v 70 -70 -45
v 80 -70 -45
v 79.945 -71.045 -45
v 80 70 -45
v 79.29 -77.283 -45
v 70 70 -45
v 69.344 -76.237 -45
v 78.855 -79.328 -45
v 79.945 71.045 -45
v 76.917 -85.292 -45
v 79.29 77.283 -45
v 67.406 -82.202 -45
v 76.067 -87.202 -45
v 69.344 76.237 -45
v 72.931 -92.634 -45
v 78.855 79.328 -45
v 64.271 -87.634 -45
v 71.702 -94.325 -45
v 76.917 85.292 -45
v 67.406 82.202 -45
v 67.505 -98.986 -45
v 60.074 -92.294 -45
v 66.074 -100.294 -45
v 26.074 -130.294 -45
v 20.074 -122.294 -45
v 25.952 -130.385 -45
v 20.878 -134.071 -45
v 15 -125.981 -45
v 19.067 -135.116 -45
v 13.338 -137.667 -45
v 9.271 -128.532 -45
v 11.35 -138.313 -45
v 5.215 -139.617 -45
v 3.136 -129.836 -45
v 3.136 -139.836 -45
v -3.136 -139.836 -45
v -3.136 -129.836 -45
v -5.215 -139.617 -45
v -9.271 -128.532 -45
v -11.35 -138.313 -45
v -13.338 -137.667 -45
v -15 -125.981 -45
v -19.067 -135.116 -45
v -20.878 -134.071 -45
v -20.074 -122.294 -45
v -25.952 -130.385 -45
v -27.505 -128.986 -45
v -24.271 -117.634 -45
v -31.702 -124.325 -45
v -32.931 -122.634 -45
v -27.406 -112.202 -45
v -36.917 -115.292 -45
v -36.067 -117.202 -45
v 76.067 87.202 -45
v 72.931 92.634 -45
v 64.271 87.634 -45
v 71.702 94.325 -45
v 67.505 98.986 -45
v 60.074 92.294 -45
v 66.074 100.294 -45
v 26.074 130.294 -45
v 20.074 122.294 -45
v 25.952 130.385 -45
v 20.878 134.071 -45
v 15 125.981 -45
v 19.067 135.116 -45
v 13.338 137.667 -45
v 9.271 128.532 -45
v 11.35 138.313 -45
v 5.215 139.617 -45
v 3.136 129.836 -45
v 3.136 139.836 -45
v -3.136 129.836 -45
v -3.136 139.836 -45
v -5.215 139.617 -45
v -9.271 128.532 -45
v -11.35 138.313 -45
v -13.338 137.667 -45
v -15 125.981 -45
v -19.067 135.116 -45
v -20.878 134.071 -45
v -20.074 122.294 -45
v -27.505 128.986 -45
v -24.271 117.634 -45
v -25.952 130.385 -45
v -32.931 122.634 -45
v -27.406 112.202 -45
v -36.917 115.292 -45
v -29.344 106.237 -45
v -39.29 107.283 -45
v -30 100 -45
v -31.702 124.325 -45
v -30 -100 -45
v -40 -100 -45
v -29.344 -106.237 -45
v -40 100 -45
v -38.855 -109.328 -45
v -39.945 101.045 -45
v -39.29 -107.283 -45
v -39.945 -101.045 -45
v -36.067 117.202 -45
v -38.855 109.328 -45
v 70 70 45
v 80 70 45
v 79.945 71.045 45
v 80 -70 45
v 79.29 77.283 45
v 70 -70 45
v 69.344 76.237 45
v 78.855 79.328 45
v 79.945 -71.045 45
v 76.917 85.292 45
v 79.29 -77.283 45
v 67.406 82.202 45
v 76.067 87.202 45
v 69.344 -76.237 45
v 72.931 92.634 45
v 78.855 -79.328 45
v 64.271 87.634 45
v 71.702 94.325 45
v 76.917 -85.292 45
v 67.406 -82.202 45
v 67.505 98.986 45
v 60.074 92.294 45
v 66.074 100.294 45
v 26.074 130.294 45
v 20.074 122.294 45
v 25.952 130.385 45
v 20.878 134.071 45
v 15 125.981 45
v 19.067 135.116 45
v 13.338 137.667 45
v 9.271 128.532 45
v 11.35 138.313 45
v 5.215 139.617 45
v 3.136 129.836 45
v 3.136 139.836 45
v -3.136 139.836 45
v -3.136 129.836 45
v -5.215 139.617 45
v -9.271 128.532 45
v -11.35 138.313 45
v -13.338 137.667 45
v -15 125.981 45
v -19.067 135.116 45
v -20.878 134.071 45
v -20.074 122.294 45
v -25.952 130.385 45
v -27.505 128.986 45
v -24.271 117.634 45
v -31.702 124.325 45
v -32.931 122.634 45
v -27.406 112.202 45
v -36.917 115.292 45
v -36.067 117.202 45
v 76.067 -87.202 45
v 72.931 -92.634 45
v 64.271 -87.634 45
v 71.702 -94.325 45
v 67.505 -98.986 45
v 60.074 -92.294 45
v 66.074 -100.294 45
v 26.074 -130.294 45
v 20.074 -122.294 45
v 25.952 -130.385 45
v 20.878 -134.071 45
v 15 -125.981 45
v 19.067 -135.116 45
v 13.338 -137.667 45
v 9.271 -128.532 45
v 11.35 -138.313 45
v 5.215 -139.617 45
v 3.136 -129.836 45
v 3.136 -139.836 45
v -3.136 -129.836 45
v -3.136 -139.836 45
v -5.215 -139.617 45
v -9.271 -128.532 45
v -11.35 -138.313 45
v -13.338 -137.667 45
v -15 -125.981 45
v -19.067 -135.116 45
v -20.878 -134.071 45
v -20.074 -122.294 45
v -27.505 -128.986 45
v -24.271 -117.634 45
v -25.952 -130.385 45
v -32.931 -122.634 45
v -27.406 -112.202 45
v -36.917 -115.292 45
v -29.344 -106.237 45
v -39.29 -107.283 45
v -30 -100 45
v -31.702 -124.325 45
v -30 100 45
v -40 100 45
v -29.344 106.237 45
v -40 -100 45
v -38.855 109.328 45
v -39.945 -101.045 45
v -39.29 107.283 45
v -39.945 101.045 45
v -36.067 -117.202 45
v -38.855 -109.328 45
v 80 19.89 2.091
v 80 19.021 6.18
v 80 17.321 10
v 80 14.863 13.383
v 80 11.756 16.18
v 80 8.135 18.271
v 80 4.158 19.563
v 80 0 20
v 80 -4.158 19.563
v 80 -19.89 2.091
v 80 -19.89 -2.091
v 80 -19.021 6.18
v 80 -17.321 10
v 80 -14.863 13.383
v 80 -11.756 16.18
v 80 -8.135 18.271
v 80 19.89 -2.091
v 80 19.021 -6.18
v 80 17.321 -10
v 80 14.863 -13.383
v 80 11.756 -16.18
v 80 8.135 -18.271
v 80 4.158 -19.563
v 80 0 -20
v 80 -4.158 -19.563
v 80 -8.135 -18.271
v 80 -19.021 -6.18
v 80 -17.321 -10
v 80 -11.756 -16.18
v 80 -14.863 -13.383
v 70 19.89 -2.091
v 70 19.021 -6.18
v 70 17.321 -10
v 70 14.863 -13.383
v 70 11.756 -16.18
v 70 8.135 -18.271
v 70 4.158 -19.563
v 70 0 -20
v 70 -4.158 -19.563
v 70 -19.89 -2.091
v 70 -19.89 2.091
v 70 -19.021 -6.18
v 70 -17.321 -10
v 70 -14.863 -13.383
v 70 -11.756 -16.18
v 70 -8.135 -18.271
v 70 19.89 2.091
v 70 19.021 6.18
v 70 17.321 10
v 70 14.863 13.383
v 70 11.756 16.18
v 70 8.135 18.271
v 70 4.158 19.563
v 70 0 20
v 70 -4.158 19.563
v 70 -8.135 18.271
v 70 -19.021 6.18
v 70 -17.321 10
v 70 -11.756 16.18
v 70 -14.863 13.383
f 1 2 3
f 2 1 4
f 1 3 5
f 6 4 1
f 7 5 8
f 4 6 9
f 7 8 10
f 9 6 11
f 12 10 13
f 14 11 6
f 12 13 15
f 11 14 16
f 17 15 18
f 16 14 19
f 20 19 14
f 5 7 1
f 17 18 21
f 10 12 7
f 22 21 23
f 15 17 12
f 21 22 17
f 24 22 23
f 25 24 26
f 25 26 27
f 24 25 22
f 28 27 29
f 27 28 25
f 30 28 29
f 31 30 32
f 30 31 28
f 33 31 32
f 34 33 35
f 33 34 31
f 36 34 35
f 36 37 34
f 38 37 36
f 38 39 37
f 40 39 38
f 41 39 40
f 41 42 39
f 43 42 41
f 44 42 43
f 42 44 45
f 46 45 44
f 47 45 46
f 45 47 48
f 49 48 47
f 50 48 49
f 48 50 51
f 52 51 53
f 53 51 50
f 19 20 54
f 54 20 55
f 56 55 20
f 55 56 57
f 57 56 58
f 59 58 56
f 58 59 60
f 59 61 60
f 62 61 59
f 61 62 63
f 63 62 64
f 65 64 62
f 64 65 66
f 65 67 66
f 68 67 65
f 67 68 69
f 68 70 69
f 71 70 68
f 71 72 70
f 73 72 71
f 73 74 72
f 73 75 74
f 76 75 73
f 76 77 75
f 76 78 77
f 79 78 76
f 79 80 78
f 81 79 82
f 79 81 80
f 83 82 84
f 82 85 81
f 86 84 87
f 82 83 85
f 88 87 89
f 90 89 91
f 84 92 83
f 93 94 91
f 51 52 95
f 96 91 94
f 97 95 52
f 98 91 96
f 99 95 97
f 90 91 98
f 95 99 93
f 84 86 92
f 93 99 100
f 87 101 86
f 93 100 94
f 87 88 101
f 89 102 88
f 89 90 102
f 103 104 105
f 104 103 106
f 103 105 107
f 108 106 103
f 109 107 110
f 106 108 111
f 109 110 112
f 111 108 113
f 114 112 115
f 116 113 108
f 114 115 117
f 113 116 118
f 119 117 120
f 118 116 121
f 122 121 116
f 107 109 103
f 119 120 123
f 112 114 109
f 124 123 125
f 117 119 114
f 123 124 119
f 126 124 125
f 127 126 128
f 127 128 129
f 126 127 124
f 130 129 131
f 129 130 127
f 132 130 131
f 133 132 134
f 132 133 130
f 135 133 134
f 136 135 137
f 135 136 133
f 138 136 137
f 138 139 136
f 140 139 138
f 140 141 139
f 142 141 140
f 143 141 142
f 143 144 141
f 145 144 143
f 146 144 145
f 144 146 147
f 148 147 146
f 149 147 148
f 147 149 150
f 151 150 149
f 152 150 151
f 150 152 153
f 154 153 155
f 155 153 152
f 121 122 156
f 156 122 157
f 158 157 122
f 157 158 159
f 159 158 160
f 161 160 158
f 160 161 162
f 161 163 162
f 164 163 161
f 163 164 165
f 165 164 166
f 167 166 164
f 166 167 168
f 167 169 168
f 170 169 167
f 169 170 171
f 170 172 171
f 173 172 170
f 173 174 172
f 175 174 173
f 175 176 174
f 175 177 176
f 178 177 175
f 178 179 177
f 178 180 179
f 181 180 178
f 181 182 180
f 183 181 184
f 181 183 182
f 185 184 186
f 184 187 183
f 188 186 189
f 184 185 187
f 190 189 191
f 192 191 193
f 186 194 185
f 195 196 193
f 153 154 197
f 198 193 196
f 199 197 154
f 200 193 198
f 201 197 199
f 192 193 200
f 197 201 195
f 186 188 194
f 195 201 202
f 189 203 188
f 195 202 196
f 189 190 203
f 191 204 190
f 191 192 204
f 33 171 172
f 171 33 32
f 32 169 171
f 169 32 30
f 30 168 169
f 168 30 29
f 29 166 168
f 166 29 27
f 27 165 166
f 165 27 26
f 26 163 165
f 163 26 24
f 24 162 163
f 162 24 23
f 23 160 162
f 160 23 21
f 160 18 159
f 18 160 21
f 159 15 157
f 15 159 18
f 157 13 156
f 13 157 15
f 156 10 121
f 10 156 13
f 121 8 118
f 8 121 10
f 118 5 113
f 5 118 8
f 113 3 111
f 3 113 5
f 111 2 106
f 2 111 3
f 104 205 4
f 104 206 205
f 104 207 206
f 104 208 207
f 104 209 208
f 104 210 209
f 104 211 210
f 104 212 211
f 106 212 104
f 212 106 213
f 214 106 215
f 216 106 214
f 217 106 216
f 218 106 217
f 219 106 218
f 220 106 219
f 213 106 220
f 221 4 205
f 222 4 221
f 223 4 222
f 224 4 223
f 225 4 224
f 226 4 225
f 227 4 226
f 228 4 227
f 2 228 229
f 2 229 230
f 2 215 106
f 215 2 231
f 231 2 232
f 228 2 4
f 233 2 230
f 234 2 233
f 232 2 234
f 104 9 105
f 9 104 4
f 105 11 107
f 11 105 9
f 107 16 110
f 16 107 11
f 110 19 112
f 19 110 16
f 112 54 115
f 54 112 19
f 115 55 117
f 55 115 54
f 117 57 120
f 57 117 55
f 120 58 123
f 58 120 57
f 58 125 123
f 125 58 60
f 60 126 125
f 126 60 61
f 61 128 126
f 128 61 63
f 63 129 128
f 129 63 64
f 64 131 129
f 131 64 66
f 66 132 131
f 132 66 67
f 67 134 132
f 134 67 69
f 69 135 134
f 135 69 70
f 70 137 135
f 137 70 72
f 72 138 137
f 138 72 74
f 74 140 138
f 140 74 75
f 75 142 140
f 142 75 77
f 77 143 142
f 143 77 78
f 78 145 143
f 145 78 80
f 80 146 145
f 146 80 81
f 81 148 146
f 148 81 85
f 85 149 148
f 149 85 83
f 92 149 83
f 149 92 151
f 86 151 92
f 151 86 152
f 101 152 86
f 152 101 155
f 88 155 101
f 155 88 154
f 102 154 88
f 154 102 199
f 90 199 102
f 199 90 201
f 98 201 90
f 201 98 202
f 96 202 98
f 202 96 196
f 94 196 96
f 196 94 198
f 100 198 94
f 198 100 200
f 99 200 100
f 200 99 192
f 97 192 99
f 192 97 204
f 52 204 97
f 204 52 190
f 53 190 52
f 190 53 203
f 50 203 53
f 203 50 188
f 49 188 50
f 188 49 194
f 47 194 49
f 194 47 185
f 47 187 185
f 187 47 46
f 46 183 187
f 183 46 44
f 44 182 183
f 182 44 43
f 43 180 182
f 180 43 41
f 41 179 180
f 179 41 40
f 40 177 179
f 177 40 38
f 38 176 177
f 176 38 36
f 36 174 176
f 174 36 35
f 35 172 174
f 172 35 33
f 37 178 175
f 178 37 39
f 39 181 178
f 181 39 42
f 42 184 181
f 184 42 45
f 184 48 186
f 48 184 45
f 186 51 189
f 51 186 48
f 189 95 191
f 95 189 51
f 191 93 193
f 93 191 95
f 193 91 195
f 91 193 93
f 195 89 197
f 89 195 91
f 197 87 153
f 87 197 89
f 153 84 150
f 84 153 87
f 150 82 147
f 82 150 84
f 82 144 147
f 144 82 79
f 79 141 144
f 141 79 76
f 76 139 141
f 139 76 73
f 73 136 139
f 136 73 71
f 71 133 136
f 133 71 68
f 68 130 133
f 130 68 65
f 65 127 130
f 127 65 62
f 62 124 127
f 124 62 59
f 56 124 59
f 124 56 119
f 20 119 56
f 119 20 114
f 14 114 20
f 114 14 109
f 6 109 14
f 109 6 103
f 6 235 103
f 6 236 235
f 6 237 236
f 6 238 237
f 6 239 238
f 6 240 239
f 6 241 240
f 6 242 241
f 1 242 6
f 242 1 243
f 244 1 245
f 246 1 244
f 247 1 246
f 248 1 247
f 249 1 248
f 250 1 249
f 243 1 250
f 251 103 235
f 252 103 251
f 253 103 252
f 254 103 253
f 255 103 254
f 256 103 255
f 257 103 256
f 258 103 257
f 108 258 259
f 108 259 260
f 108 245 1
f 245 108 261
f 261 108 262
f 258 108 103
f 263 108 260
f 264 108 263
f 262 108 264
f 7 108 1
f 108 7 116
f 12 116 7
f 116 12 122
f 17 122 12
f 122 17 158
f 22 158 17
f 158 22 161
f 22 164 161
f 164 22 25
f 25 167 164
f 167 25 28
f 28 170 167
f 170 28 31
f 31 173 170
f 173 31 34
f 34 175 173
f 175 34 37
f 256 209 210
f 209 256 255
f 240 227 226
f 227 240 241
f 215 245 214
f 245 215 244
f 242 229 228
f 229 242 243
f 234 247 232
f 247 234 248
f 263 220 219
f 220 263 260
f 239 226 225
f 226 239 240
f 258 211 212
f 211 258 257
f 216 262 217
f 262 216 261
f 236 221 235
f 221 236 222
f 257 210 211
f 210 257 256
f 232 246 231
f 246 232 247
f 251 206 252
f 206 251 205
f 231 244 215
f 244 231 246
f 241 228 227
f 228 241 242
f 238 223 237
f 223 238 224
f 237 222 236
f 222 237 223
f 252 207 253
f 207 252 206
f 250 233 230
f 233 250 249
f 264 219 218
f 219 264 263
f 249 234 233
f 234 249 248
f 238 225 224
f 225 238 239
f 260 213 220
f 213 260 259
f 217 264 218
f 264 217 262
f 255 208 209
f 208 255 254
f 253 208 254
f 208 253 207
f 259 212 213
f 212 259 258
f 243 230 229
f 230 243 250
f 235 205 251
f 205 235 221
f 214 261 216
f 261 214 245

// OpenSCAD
// Modern Inverted Bottle Stand
// by Urban Reininger - aka: UrbanAtWork on Thingiverse and Twitter
// Version 0.1 - May 2016


// Depth of stand
depth = 90; // [1:250]
// How Tall?
tall = 40; // [1:300]
// Bottle Hole Size
bottleHole = 40; // [1:0.1:250]
// Top Width - top of trapazoid
topWidth = 70; // [1:300]
// Base Width - bottom of trapazoid
baseWidth =100;   // [1:300]

// preview[view:south, tilt:bottom diagonal]

// detail level
//$fn =100; 

// RENDERS
color("orange")
rotate([0,0,0])
difference(){

    linear_extrude(height = depth, center = true, convexity = 10){
        difference(){
            
            offset(r = 10){
                hull(){
                    translate([tall,-topWidth,0])
                        circle(30);    
                    translate([tall,topWidth,0])
                        circle(30);  
                        
                    translate([0,-baseWidth,0])
                        circle(30);
                    translate([0,baseWidth,0])
                        circle(30);
                }
            }

        // the cut out
                hull(){
                    translate([tall,-topWidth,0])
                        circle(30);    
                    translate([tall,topWidth,0])
                        circle(30);  
                        
                    translate([0,-baseWidth,0])
                        circle(30);
                    translate([0,baseWidth,0])
                        circle(30);
                }
            }
        }
        
   // cut out for bottle top
        translate([tall,0,0])
        rotate([0,90,0])
        cylinder(d=bottleHole,h=60, center=false);
    }
